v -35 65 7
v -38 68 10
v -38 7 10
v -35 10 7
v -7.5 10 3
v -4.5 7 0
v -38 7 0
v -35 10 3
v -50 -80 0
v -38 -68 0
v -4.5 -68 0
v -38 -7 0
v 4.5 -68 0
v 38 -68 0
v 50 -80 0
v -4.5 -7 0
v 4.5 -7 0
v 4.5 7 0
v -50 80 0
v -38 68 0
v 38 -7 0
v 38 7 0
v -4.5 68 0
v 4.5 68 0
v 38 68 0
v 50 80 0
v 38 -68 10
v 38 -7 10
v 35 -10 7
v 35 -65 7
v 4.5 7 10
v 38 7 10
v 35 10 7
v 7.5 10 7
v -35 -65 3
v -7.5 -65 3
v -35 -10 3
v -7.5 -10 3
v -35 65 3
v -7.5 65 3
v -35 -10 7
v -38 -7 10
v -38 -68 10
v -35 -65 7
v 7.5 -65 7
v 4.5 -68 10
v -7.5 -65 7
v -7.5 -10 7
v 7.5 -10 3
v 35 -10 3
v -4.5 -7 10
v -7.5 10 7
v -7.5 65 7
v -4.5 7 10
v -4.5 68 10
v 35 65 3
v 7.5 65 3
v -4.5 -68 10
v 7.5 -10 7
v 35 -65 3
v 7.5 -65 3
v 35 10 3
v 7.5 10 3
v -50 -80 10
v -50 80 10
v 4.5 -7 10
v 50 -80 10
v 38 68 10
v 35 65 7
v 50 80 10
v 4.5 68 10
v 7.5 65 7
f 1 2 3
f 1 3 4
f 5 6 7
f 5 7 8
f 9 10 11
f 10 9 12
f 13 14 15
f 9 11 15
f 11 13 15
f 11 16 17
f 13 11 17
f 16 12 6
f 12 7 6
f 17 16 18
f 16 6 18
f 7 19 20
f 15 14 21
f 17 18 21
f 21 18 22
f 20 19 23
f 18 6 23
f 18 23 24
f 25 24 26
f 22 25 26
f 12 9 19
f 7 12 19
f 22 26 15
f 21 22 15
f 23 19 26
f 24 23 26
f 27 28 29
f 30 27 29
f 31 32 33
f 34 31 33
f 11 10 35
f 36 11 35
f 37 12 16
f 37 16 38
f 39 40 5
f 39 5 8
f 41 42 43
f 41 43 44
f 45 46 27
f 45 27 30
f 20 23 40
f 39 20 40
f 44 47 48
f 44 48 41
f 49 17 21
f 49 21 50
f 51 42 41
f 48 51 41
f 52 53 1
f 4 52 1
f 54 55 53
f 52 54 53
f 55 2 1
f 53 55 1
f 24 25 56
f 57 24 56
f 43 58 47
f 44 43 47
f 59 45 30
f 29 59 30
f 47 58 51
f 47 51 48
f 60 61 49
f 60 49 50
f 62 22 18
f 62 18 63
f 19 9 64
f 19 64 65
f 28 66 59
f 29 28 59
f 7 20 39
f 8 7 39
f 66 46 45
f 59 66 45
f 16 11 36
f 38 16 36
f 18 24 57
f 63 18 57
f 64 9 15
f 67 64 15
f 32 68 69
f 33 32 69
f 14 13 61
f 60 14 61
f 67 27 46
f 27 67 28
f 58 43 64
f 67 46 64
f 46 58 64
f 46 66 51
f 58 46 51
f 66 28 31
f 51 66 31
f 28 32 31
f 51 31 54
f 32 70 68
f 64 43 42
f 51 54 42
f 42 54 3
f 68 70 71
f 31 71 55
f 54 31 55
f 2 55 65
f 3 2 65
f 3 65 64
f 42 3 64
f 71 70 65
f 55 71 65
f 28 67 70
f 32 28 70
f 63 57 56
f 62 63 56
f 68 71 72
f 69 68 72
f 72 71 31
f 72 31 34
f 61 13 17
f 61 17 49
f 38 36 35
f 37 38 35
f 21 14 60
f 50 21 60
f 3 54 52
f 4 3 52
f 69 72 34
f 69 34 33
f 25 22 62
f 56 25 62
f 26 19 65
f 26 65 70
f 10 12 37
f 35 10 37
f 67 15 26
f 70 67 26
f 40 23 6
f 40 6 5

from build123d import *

# Parameters (mm, degrees)
SKETCH1_W               = 100
SKETCH1_H               = 160
BOSS_EXTRUDE1_DEPTH     = 10
SKETCH2_W               = 37.5
SKETCH2_H               = 65
CUT_EXTRUDE1_DEPTH      = 3
MIRROR6_COPY_1_SKETCH_W = 37.5
MIRROR6_COPY_1_SKETCH_H = 65
MIRROR6_COPY_1_DEPTH    = 3
MIRROR7_COPY_1_SKETCH_W = 37.5
MIRROR7_COPY_1_SKETCH_H = 65
MIRROR7_COPY_1_DEPTH    = 3
MIRROR7_COPY_2_SKETCH_W = 37.5
MIRROR7_COPY_2_SKETCH_H = 65
MIRROR7_COPY_2_DEPTH    = 3
MIRROR7_COPY_3_SKETCH_W = 37.5
MIRROR7_COPY_3_SKETCH_H = 65
MIRROR7_COPY_3_DEPTH    = 3
CHAMFER2_SIZE           = 5


with BuildPart() as part:
    # Sketch1 → Boss-Extrude1 (new body)
    with BuildSketch(Plane.XY):
        Rectangle(SKETCH1_W, SKETCH1_H)
    extrude(amount=BOSS_EXTRUDE1_DEPTH)

    # Sketch2 → Cut-Extrude1 (cut)
    with BuildSketch(Plane.XY.offset(10)):
        with Locations((21.25, 37.5)):
            Rectangle(SKETCH2_W, SKETCH2_H)
    cut_extrude1 = extrude(amount=-CUT_EXTRUDE1_DEPTH, mode=Mode.SUBTRACT)

    # Mirror5: Cut-Extrude1 across plane
    add(cut_extrude1.mirror(Plane.ZX), mode=Mode.SUBTRACT)

    # Mirror6: Cut-Extrude1 across plane
    add(cut_extrude1.mirror(Plane(origin=(0, 0, 0), x_dir=(0, 0, 1), z_dir=(1, 0, 0))), mode=Mode.SUBTRACT)

    # Mirror6 copy 1 sketch → Mirror6 copy 1 (cut)
    with BuildSketch(Plane(origin=(0, 0, 10), x_dir=(-1, 0, 0), z_dir=(0, 0, 1))):
        with Locations((21.25, 37.5)):
            Rectangle(MIRROR6_COPY_1_SKETCH_W, MIRROR6_COPY_1_SKETCH_H)
    extrude(amount=-MIRROR6_COPY_1_DEPTH, mode=Mode.SUBTRACT)

    # Mirror7: Cut-Extrude1 across plane
    add(cut_extrude1.mirror(Plane.XY.offset(5)), mode=Mode.SUBTRACT)

    # Mirror7 copy 1 sketch → Mirror7 copy 1 (cut)
    with BuildSketch(Plane(origin=(0, 0, 0), x_dir=(1, 0, 0), z_dir=(0, 0, -1))):
        with Locations((21.25, 37.5)):
            Rectangle(MIRROR7_COPY_1_SKETCH_W, MIRROR7_COPY_1_SKETCH_H)
    extrude(amount=-MIRROR7_COPY_1_DEPTH, mode=Mode.SUBTRACT)

    # Mirror7 copy 2 sketch → Mirror7 copy 2 (cut)
    with BuildSketch(Plane(origin=(0, 0, 0), x_dir=(-1, 0, 0), z_dir=(0, 0, -1))):
        with Locations((21.25, 37.5)):
            Rectangle(MIRROR7_COPY_2_SKETCH_W, MIRROR7_COPY_2_SKETCH_H)
    extrude(amount=-MIRROR7_COPY_2_DEPTH, mode=Mode.SUBTRACT)

    # Mirror7 copy 3 sketch → Mirror7 copy 3 (cut)
    with BuildSketch(Plane(origin=(0, 0, 0), x_dir=(-1, 0, 0), z_dir=(0, 0, -1))):
        with Locations((21.25, -37.5)):
            Rectangle(MIRROR7_COPY_3_SKETCH_W, MIRROR7_COPY_3_SKETCH_H)
    extrude(amount=-MIRROR7_COPY_3_DEPTH, mode=Mode.SUBTRACT)

    # Chamfer2
    # the kernel refuses this chamfer: 5 mm, written as the material it adds along each edge
    with BuildSketch(Plane(origin=(10.35841494, -5, 3), x_dir=(0, 0.027495876610586317, -0.9996219169112968), z_dir=(-1, 0, 0))) as chamfer2_piece_1_section:
        Polygon((CHAMFER2_SIZE * 0.999621916911, CHAMFER2_SIZE * 0.0274958766106), (-CHAMFER2_SIZE * 0.0274958766106, CHAMFER2_SIZE * 0.999621916911), (0, 0), align=None)
    chamfer2_piece_1 = extrude(amount=50.35841494, mode=Mode.PRIVATE)
    chamfer2_piece_1 = split(chamfer2_piece_1, bisect_by=Plane(origin=(6.42920747, -6.857142857, 0), z_dir=(0, 0, 1)), keep=Keep.TOP, mode=Mode.PRIVATE)
    add(chamfer2_piece_1)
    with BuildSketch(Plane(origin=(-40, 7.85841494, 3), x_dir=(-0.027495876610586317, 0, -0.9996219169112968), z_dir=(0, -1, 0))) as chamfer2_piece_2_section:
        Polygon((CHAMFER2_SIZE * 0.999621916911, CHAMFER2_SIZE * 0.0274958766106), (-CHAMFER2_SIZE * 0.0274958766106, CHAMFER2_SIZE * 0.999621916911), (0, 0), align=None)
    chamfer2_piece_2 = extrude(amount=77.85841494, mode=Mode.PRIVATE)
    chamfer2_piece_2 = split(chamfer2_piece_2, bisect_by=Plane(origin=(-38.142857143, 6.42920747, 0), z_dir=(0, 0, 1)), keep=Keep.TOP, mode=Mode.PRIVATE)
    add(chamfer2_piece_2)
    with BuildSketch(Plane(origin=(-40, -70, 3), x_dir=(0, -0.0274958766105877, -0.9996219169112968), z_dir=(1, 0, 0))) as chamfer2_piece_3_section:
        Polygon((CHAMFER2_SIZE * 0.999621916911, CHAMFER2_SIZE * 0.0274958766106), (-CHAMFER2_SIZE * 0.0274958766106, CHAMFER2_SIZE * 0.999621916911), (0, 0), align=None)
    chamfer2_piece_3 = extrude(amount=50.35841494, mode=Mode.PRIVATE)
    chamfer2_piece_3 = split(chamfer2_piece_3, bisect_by=Plane(origin=(-21.25, -68.142857143, 0), z_dir=(0, 0, 1)), keep=Keep.TOP, mode=Mode.PRIVATE)
    add(chamfer2_piece_3)
    with BuildSketch(Plane(origin=(-2.5, -70, 3), x_dir=(0.027495876610586403, 0, -0.9996219169112968), z_dir=(0, 1, 0))) as chamfer2_piece_4_section:
        Polygon((CHAMFER2_SIZE * 0.999621916911, CHAMFER2_SIZE * 0.0274958766106), (-CHAMFER2_SIZE * 0.0274958766106, CHAMFER2_SIZE * 0.999621916911), (0, 0), align=None)
    chamfer2_piece_4 = extrude(amount=77.85841494, mode=Mode.PRIVATE)
    chamfer2_piece_4 = split(chamfer2_piece_4, bisect_by=Plane(origin=(-4.357142857, -37.5, 0), z_dir=(0, 0, 1)), keep=Keep.TOP, mode=Mode.PRIVATE)
    add(chamfer2_piece_4)
    with BuildSketch(Plane(origin=(-40, -70, 7), x_dir=(0, -0.0274958766105877, 0.9996219169112968), z_dir=(1, 0, 0))) as chamfer2_piece_5_section:
        Polygon((CHAMFER2_SIZE * 0.999621916911, -CHAMFER2_SIZE * 0.0274958766106), (-CHAMFER2_SIZE * 0.0274958766106, -CHAMFER2_SIZE * 0.999621916911), (0, 0), align=None)
    chamfer2_piece_5 = extrude(amount=50.35841494, mode=Mode.PRIVATE)
    chamfer2_piece_5 = split(chamfer2_piece_5, bisect_by=Plane(origin=(-21.25, -68.142857143, 10), z_dir=(0, 0, -1)), keep=Keep.TOP, mode=Mode.PRIVATE)
    add(chamfer2_piece_5)
    with BuildSketch(Plane(origin=(-40, 7.85841494, 7), x_dir=(-0.027495876610586317, 0, 0.9996219169112968), z_dir=(0, -1, 0))) as chamfer2_piece_6_section:
        Polygon((CHAMFER2_SIZE * 0.999621916911, -CHAMFER2_SIZE * 0.0274958766106), (-CHAMFER2_SIZE * 0.0274958766106, -CHAMFER2_SIZE * 0.999621916911), (0, 0), align=None)
    chamfer2_piece_6 = extrude(amount=77.85841494, mode=Mode.PRIVATE)
    chamfer2_piece_6 = split(chamfer2_piece_6, bisect_by=Plane(origin=(-38.142857143, 6.42920747, 10), z_dir=(0, 0, -1)), keep=Keep.TOP, mode=Mode.PRIVATE)
    add(chamfer2_piece_6)
    with BuildSketch(Plane(origin=(10.35841494, -5, 7), x_dir=(0, 0.027495876610586317, 0.9996219169112968), z_dir=(-1, 0, 0))) as chamfer2_piece_7_section:
        Polygon((CHAMFER2_SIZE * 0.999621916911, -CHAMFER2_SIZE * 0.0274958766106), (-CHAMFER2_SIZE * 0.0274958766106, -CHAMFER2_SIZE * 0.999621916911), (0, 0), align=None)
    chamfer2_piece_7 = extrude(amount=50.35841494, mode=Mode.PRIVATE)
    chamfer2_piece_7 = split(chamfer2_piece_7, bisect_by=Plane(origin=(6.42920747, -6.857142857, 10), z_dir=(0, 0, -1)), keep=Keep.TOP, mode=Mode.PRIVATE)
    add(chamfer2_piece_7)
    with BuildSketch(Plane(origin=(-2.5, -70, 7), x_dir=(0.027495876610586403, 0, 0.9996219169112968), z_dir=(0, 1, 0))) as chamfer2_piece_8_section:
        Polygon((CHAMFER2_SIZE * 0.999621916911, -CHAMFER2_SIZE * 0.0274958766106), (-CHAMFER2_SIZE * 0.0274958766106, -CHAMFER2_SIZE * 0.999621916911), (0, 0), align=None)
    chamfer2_piece_8 = extrude(amount=77.85841494, mode=Mode.PRIVATE)
    chamfer2_piece_8 = split(chamfer2_piece_8, bisect_by=Plane(origin=(-4.357142857, -37.5, 10), z_dir=(0, 0, -1)), keep=Keep.TOP, mode=Mode.PRIVATE)
    add(chamfer2_piece_8)
    with BuildSketch(Plane(origin=(-10.35841494, 5, 3), x_dir=(0, -0.027495876610586317, -0.9996219169112968), z_dir=(1, 0, 0))) as chamfer2_piece_9_section:
        Polygon((CHAMFER2_SIZE * 0.999621916911, CHAMFER2_SIZE * 0.0274958766106), (-CHAMFER2_SIZE * 0.0274958766106, CHAMFER2_SIZE * 0.999621916911), (0, 0), align=None)
    chamfer2_piece_9 = extrude(amount=50.35841494, mode=Mode.PRIVATE)
    chamfer2_piece_9 = split(chamfer2_piece_9, bisect_by=Plane(origin=(-6.42920747, 6.857142857, 0), z_dir=(0, 0, 1)), keep=Keep.TOP, mode=Mode.PRIVATE)
    add(chamfer2_piece_9)
    with BuildSketch(Plane(origin=(40, -7.85841494, 3), x_dir=(0.027495876610586317, 0, -0.9996219169112968), z_dir=(0, 1, 0))) as chamfer2_piece_10_section:
        Polygon((CHAMFER2_SIZE * 0.999621916911, CHAMFER2_SIZE * 0.0274958766106), (-CHAMFER2_SIZE * 0.0274958766106, CHAMFER2_SIZE * 0.999621916911), (0, 0), align=None)
    chamfer2_piece_10 = extrude(amount=77.85841494, mode=Mode.PRIVATE)
    chamfer2_piece_10 = split(chamfer2_piece_10, bisect_by=Plane(origin=(38.142857143, -6.42920747, 0), z_dir=(0, 0, 1)), keep=Keep.TOP, mode=Mode.PRIVATE)
    add(chamfer2_piece_10)
    with BuildSketch(Plane(origin=(40, 70, 3), x_dir=(0, 0.0274958766105877, -0.9996219169112968), z_dir=(-1, 0, 0))) as chamfer2_piece_11_section:
        Polygon((CHAMFER2_SIZE * 0.999621916911, CHAMFER2_SIZE * 0.0274958766106), (-CHAMFER2_SIZE * 0.0274958766106, CHAMFER2_SIZE * 0.999621916911), (0, 0), align=None)
    chamfer2_piece_11 = extrude(amount=50.35841494, mode=Mode.PRIVATE)
    chamfer2_piece_11 = split(chamfer2_piece_11, bisect_by=Plane(origin=(21.25, 68.142857143, 0), z_dir=(0, 0, 1)), keep=Keep.TOP, mode=Mode.PRIVATE)
    add(chamfer2_piece_11)
    with BuildSketch(Plane(origin=(2.5, 70, 3), x_dir=(-0.027495876610586403, 0, -0.9996219169112968), z_dir=(0, -1, 0))) as chamfer2_piece_12_section:
        Polygon((CHAMFER2_SIZE * 0.999621916911, CHAMFER2_SIZE * 0.0274958766106), (-CHAMFER2_SIZE * 0.0274958766106, CHAMFER2_SIZE * 0.999621916911), (0, 0), align=None)
    chamfer2_piece_12 = extrude(amount=77.85841494, mode=Mode.PRIVATE)
    chamfer2_piece_12 = split(chamfer2_piece_12, bisect_by=Plane(origin=(4.357142857, 37.5, 0), z_dir=(0, 0, 1)), keep=Keep.TOP, mode=Mode.PRIVATE)
    add(chamfer2_piece_12)
    with BuildSketch(Plane(origin=(-40, 70, 3), x_dir=(0, 0.0274958766105877, -0.9996219169112968), z_dir=(1, 0, 0))) as chamfer2_piece_13_section:
        Polygon((CHAMFER2_SIZE * 0.999621916911, -CHAMFER2_SIZE * 0.0274958766106), (-CHAMFER2_SIZE * 0.0274958766106, -CHAMFER2_SIZE * 0.999621916911), (0, 0), align=None)
    chamfer2_piece_13 = extrude(amount=50.35841494, mode=Mode.PRIVATE)
    chamfer2_piece_13 = split(chamfer2_piece_13, bisect_by=Plane(origin=(-21.25, 68.142857143, 0), z_dir=(0, 0, 1)), keep=Keep.TOP, mode=Mode.PRIVATE)
    add(chamfer2_piece_13)
    with BuildSketch(Plane(origin=(-40, -7.85841494, 3), x_dir=(-0.027495876610586317, 0, -0.9996219169112968), z_dir=(0, 1, 0))) as chamfer2_piece_14_section:
        Polygon((CHAMFER2_SIZE * 0.999621916911, -CHAMFER2_SIZE * 0.0274958766106), (-CHAMFER2_SIZE * 0.0274958766106, -CHAMFER2_SIZE * 0.999621916911), (0, 0), align=None)
    chamfer2_piece_14 = extrude(amount=77.85841494, mode=Mode.PRIVATE)
    chamfer2_piece_14 = split(chamfer2_piece_14, bisect_by=Plane(origin=(-38.142857143, -6.42920747, 0), z_dir=(0, 0, 1)), keep=Keep.TOP, mode=Mode.PRIVATE)
    add(chamfer2_piece_14)
    with BuildSketch(Plane(origin=(10.35841494, 5, 3), x_dir=(0, -0.027495876610586317, -0.9996219169112968), z_dir=(-1, 0, 0))) as chamfer2_piece_15_section:
        Polygon((CHAMFER2_SIZE * 0.999621916911, -CHAMFER2_SIZE * 0.0274958766106), (-CHAMFER2_SIZE * 0.0274958766106, -CHAMFER2_SIZE * 0.999621916911), (0, 0), align=None)
    chamfer2_piece_15 = extrude(amount=50.35841494, mode=Mode.PRIVATE)
    chamfer2_piece_15 = split(chamfer2_piece_15, bisect_by=Plane(origin=(6.42920747, 6.857142857, 0), z_dir=(0, 0, 1)), keep=Keep.TOP, mode=Mode.PRIVATE)
    add(chamfer2_piece_15)
    with BuildSketch(Plane(origin=(-2.5, 70, 3), x_dir=(0.027495876610586403, 0, -0.9996219169112968), z_dir=(0, -1, 0))) as chamfer2_piece_16_section:
        Polygon((CHAMFER2_SIZE * 0.999621916911, -CHAMFER2_SIZE * 0.0274958766106), (-CHAMFER2_SIZE * 0.0274958766106, -CHAMFER2_SIZE * 0.999621916911), (0, 0), align=None)
    chamfer2_piece_16 = extrude(amount=77.85841494, mode=Mode.PRIVATE)
    chamfer2_piece_16 = split(chamfer2_piece_16, bisect_by=Plane(origin=(-4.357142857, 37.5, 0), z_dir=(0, 0, 1)), keep=Keep.TOP, mode=Mode.PRIVATE)
    add(chamfer2_piece_16)
    with BuildSketch(Plane(origin=(40, -70, 3), x_dir=(0, -0.0274958766105877, -0.9996219169112968), z_dir=(-1, 0, 0))) as chamfer2_piece_17_section:
        Polygon((CHAMFER2_SIZE * 0.999621916911, -CHAMFER2_SIZE * 0.0274958766106), (-CHAMFER2_SIZE * 0.0274958766106, -CHAMFER2_SIZE * 0.999621916911), (0, 0), align=None)
    chamfer2_piece_17 = extrude(amount=50.35841494, mode=Mode.PRIVATE)
    chamfer2_piece_17 = split(chamfer2_piece_17, bisect_by=Plane(origin=(21.25, -68.142857143, 0), z_dir=(0, 0, 1)), keep=Keep.TOP, mode=Mode.PRIVATE)
    add(chamfer2_piece_17)
    with BuildSketch(Plane(origin=(40, 7.85841494, 3), x_dir=(0.027495876610586317, 0, -0.9996219169112968), z_dir=(0, -1, 0))) as chamfer2_piece_18_section:
        Polygon((CHAMFER2_SIZE * 0.999621916911, -CHAMFER2_SIZE * 0.0274958766106), (-CHAMFER2_SIZE * 0.0274958766106, -CHAMFER2_SIZE * 0.999621916911), (0, 0), align=None)
    chamfer2_piece_18 = extrude(amount=77.85841494, mode=Mode.PRIVATE)
    chamfer2_piece_18 = split(chamfer2_piece_18, bisect_by=Plane(origin=(38.142857143, 6.42920747, 0), z_dir=(0, 0, 1)), keep=Keep.TOP, mode=Mode.PRIVATE)
    add(chamfer2_piece_18)
    with BuildSketch(Plane(origin=(-10.35841494, -5, 3), x_dir=(0, 0.027495876610586317, -0.9996219169112968), z_dir=(1, 0, 0))) as chamfer2_piece_19_section:
        Polygon((CHAMFER2_SIZE * 0.999621916911, -CHAMFER2_SIZE * 0.0274958766106), (-CHAMFER2_SIZE * 0.0274958766106, -CHAMFER2_SIZE * 0.999621916911), (0, 0), align=None)
    chamfer2_piece_19 = extrude(amount=50.35841494, mode=Mode.PRIVATE)
    chamfer2_piece_19 = split(chamfer2_piece_19, bisect_by=Plane(origin=(-6.42920747, -6.857142857, 0), z_dir=(0, 0, 1)), keep=Keep.TOP, mode=Mode.PRIVATE)
    add(chamfer2_piece_19)
    with BuildSketch(Plane(origin=(2.5, -70, 3), x_dir=(-0.027495876610586403, 0, -0.9996219169112968), z_dir=(0, 1, 0))) as chamfer2_piece_20_section:
        Polygon((CHAMFER2_SIZE * 0.999621916911, -CHAMFER2_SIZE * 0.0274958766106), (-CHAMFER2_SIZE * 0.0274958766106, -CHAMFER2_SIZE * 0.999621916911), (0, 0), align=None)
    chamfer2_piece_20 = extrude(amount=77.85841494, mode=Mode.PRIVATE)
    chamfer2_piece_20 = split(chamfer2_piece_20, bisect_by=Plane(origin=(4.357142857, -37.5, 0), z_dir=(0, 0, 1)), keep=Keep.TOP, mode=Mode.PRIVATE)
    add(chamfer2_piece_20)
    with BuildSketch(Plane(origin=(-10.35841494, -5, 7), x_dir=(0, 0.027495876610586317, 0.9996219169112968), z_dir=(1, 0, 0))) as chamfer2_piece_21_section:
        Polygon((CHAMFER2_SIZE * 0.999621916911, CHAMFER2_SIZE * 0.0274958766106), (-CHAMFER2_SIZE * 0.0274958766106, CHAMFER2_SIZE * 0.999621916911), (0, 0), align=None)
    chamfer2_piece_21 = extrude(amount=50.35841494, mode=Mode.PRIVATE)
    chamfer2_piece_21 = split(chamfer2_piece_21, bisect_by=Plane(origin=(-6.42920747, -6.857142857, 10), z_dir=(0, 0, -1)), keep=Keep.TOP, mode=Mode.PRIVATE)
    add(chamfer2_piece_21)
    with BuildSketch(Plane(origin=(40, 7.85841494, 7), x_dir=(0.027495876610586317, 0, 0.9996219169112968), z_dir=(0, -1, 0))) as chamfer2_piece_22_section:
        Polygon((CHAMFER2_SIZE * 0.999621916911, CHAMFER2_SIZE * 0.0274958766106), (-CHAMFER2_SIZE * 0.0274958766106, CHAMFER2_SIZE * 0.999621916911), (0, 0), align=None)
    chamfer2_piece_22 = extrude(amount=77.85841494, mode=Mode.PRIVATE)
    chamfer2_piece_22 = split(chamfer2_piece_22, bisect_by=Plane(origin=(38.142857143, 6.42920747, 10), z_dir=(0, 0, -1)), keep=Keep.TOP, mode=Mode.PRIVATE)
    add(chamfer2_piece_22)
    with BuildSketch(Plane(origin=(40, -70, 7), x_dir=(0, -0.0274958766105877, 0.9996219169112968), z_dir=(-1, 0, 0))) as chamfer2_piece_23_section:
        Polygon((CHAMFER2_SIZE * 0.999621916911, CHAMFER2_SIZE * 0.0274958766106), (-CHAMFER2_SIZE * 0.0274958766106, CHAMFER2_SIZE * 0.999621916911), (0, 0), align=None)
    chamfer2_piece_23 = extrude(amount=50.35841494, mode=Mode.PRIVATE)
    chamfer2_piece_23 = split(chamfer2_piece_23, bisect_by=Plane(origin=(21.25, -68.142857143, 10), z_dir=(0, 0, -1)), keep=Keep.TOP, mode=Mode.PRIVATE)
    add(chamfer2_piece_23)
    with BuildSketch(Plane(origin=(2.5, -70, 7), x_dir=(-0.027495876610586403, 0, 0.9996219169112968), z_dir=(0, 1, 0))) as chamfer2_piece_24_section:
        Polygon((CHAMFER2_SIZE * 0.999621916911, CHAMFER2_SIZE * 0.0274958766106), (-CHAMFER2_SIZE * 0.0274958766106, CHAMFER2_SIZE * 0.999621916911), (0, 0), align=None)
    chamfer2_piece_24 = extrude(amount=77.85841494, mode=Mode.PRIVATE)
    chamfer2_piece_24 = split(chamfer2_piece_24, bisect_by=Plane(origin=(4.357142857, -37.5, 10), z_dir=(0, 0, -1)), keep=Keep.TOP, mode=Mode.PRIVATE)
    add(chamfer2_piece_24)
    with BuildSketch(Plane(origin=(40, 70, 7), x_dir=(0, 0.0274958766105877, 0.9996219169112968), z_dir=(-1, 0, 0))) as chamfer2_piece_25_section:
        Polygon((CHAMFER2_SIZE * 0.999621916911, -CHAMFER2_SIZE * 0.0274958766106), (-CHAMFER2_SIZE * 0.0274958766106, -CHAMFER2_SIZE * 0.999621916911), (0, 0), align=None)
    chamfer2_piece_25 = extrude(amount=50.35841494, mode=Mode.PRIVATE)
    chamfer2_piece_25 = split(chamfer2_piece_25, bisect_by=Plane(origin=(21.25, 68.142857143, 10), z_dir=(0, 0, -1)), keep=Keep.TOP, mode=Mode.PRIVATE)
    add(chamfer2_piece_25)
    with BuildSketch(Plane(origin=(40, -7.85841494, 7), x_dir=(0.027495876610586317, 0, 0.9996219169112968), z_dir=(0, 1, 0))) as chamfer2_piece_26_section:
        Polygon((CHAMFER2_SIZE * 0.999621916911, -CHAMFER2_SIZE * 0.0274958766106), (-CHAMFER2_SIZE * 0.0274958766106, -CHAMFER2_SIZE * 0.999621916911), (0, 0), align=None)
    chamfer2_piece_26 = extrude(amount=77.85841494, mode=Mode.PRIVATE)
    chamfer2_piece_26 = split(chamfer2_piece_26, bisect_by=Plane(origin=(38.142857143, -6.42920747, 10), z_dir=(0, 0, -1)), keep=Keep.TOP, mode=Mode.PRIVATE)
    add(chamfer2_piece_26)
    with BuildSketch(Plane(origin=(-10.35841494, 5, 7), x_dir=(0, -0.027495876610586317, 0.9996219169112968), z_dir=(1, 0, 0))) as chamfer2_piece_27_section:
        Polygon((CHAMFER2_SIZE * 0.999621916911, -CHAMFER2_SIZE * 0.0274958766106), (-CHAMFER2_SIZE * 0.0274958766106, -CHAMFER2_SIZE * 0.999621916911), (0, 0), align=None)
    chamfer2_piece_27 = extrude(amount=50.35841494, mode=Mode.PRIVATE)
    chamfer2_piece_27 = split(chamfer2_piece_27, bisect_by=Plane(origin=(-6.42920747, 6.857142857, 10), z_dir=(0, 0, -1)), keep=Keep.TOP, mode=Mode.PRIVATE)
    add(chamfer2_piece_27)
    with BuildSketch(Plane(origin=(2.5, 70, 7), x_dir=(-0.027495876610586403, 0, 0.9996219169112968), z_dir=(0, -1, 0))) as chamfer2_piece_28_section:
        Polygon((CHAMFER2_SIZE * 0.999621916911, -CHAMFER2_SIZE * 0.0274958766106), (-CHAMFER2_SIZE * 0.0274958766106, -CHAMFER2_SIZE * 0.999621916911), (0, 0), align=None)
    chamfer2_piece_28 = extrude(amount=77.85841494, mode=Mode.PRIVATE)
    chamfer2_piece_28 = split(chamfer2_piece_28, bisect_by=Plane(origin=(4.357142857, 37.5, 10), z_dir=(0, 0, -1)), keep=Keep.TOP, mode=Mode.PRIVATE)
    add(chamfer2_piece_28)
    with BuildSketch(Plane(origin=(10.35841494, 5, 7), x_dir=(0, -0.027495876610586317, 0.9996219169112968), z_dir=(-1, 0, 0))) as chamfer2_piece_29_section:
        Polygon((CHAMFER2_SIZE * 0.999621916911, CHAMFER2_SIZE * 0.0274958766106), (-CHAMFER2_SIZE * 0.0274958766106, CHAMFER2_SIZE * 0.999621916911), (0, 0), align=None)
    chamfer2_piece_29 = extrude(amount=50.35841494, mode=Mode.PRIVATE)
    chamfer2_piece_29 = split(chamfer2_piece_29, bisect_by=Plane(origin=(6.42920747, 6.857142857, 10), z_dir=(0, 0, -1)), keep=Keep.TOP, mode=Mode.PRIVATE)
    add(chamfer2_piece_29)
    with BuildSketch(Plane(origin=(-40, -7.85841494, 7), x_dir=(-0.027495876610586317, 0, 0.9996219169112968), z_dir=(0, 1, 0))) as chamfer2_piece_30_section:
        Polygon((CHAMFER2_SIZE * 0.999621916911, CHAMFER2_SIZE * 0.0274958766106), (-CHAMFER2_SIZE * 0.0274958766106, CHAMFER2_SIZE * 0.999621916911), (0, 0), align=None)
    chamfer2_piece_30 = extrude(amount=77.85841494, mode=Mode.PRIVATE)
    chamfer2_piece_30 = split(chamfer2_piece_30, bisect_by=Plane(origin=(-38.142857143, -6.42920747, 10), z_dir=(0, 0, -1)), keep=Keep.TOP, mode=Mode.PRIVATE)
    add(chamfer2_piece_30)
    with BuildSketch(Plane(origin=(-40, 70, 7), x_dir=(0, 0.0274958766105877, 0.9996219169112968), z_dir=(1, 0, 0))) as chamfer2_piece_31_section:
        Polygon((CHAMFER2_SIZE * 0.999621916911, CHAMFER2_SIZE * 0.0274958766106), (-CHAMFER2_SIZE * 0.0274958766106, CHAMFER2_SIZE * 0.999621916911), (0, 0), align=None)
    chamfer2_piece_31 = extrude(amount=50.35841494, mode=Mode.PRIVATE)
    chamfer2_piece_31 = split(chamfer2_piece_31, bisect_by=Plane(origin=(-21.25, 68.142857143, 10), z_dir=(0, 0, -1)), keep=Keep.TOP, mode=Mode.PRIVATE)
    add(chamfer2_piece_31)
    with BuildSketch(Plane(origin=(-2.5, 70, 7), x_dir=(0.027495876610586403, 0, 0.9996219169112968), z_dir=(0, -1, 0))) as chamfer2_piece_32_section:
        Polygon((CHAMFER2_SIZE * 0.999621916911, CHAMFER2_SIZE * 0.0274958766106), (-CHAMFER2_SIZE * 0.0274958766106, CHAMFER2_SIZE * 0.999621916911), (0, 0), align=None)
    chamfer2_piece_32 = extrude(amount=77.85841494, mode=Mode.PRIVATE)
    chamfer2_piece_32 = split(chamfer2_piece_32, bisect_by=Plane(origin=(-4.357142857, 37.5, 10), z_dir=(0, 0, -1)), keep=Keep.TOP, mode=Mode.PRIVATE)
    add(chamfer2_piece_32)


solid = part.part
